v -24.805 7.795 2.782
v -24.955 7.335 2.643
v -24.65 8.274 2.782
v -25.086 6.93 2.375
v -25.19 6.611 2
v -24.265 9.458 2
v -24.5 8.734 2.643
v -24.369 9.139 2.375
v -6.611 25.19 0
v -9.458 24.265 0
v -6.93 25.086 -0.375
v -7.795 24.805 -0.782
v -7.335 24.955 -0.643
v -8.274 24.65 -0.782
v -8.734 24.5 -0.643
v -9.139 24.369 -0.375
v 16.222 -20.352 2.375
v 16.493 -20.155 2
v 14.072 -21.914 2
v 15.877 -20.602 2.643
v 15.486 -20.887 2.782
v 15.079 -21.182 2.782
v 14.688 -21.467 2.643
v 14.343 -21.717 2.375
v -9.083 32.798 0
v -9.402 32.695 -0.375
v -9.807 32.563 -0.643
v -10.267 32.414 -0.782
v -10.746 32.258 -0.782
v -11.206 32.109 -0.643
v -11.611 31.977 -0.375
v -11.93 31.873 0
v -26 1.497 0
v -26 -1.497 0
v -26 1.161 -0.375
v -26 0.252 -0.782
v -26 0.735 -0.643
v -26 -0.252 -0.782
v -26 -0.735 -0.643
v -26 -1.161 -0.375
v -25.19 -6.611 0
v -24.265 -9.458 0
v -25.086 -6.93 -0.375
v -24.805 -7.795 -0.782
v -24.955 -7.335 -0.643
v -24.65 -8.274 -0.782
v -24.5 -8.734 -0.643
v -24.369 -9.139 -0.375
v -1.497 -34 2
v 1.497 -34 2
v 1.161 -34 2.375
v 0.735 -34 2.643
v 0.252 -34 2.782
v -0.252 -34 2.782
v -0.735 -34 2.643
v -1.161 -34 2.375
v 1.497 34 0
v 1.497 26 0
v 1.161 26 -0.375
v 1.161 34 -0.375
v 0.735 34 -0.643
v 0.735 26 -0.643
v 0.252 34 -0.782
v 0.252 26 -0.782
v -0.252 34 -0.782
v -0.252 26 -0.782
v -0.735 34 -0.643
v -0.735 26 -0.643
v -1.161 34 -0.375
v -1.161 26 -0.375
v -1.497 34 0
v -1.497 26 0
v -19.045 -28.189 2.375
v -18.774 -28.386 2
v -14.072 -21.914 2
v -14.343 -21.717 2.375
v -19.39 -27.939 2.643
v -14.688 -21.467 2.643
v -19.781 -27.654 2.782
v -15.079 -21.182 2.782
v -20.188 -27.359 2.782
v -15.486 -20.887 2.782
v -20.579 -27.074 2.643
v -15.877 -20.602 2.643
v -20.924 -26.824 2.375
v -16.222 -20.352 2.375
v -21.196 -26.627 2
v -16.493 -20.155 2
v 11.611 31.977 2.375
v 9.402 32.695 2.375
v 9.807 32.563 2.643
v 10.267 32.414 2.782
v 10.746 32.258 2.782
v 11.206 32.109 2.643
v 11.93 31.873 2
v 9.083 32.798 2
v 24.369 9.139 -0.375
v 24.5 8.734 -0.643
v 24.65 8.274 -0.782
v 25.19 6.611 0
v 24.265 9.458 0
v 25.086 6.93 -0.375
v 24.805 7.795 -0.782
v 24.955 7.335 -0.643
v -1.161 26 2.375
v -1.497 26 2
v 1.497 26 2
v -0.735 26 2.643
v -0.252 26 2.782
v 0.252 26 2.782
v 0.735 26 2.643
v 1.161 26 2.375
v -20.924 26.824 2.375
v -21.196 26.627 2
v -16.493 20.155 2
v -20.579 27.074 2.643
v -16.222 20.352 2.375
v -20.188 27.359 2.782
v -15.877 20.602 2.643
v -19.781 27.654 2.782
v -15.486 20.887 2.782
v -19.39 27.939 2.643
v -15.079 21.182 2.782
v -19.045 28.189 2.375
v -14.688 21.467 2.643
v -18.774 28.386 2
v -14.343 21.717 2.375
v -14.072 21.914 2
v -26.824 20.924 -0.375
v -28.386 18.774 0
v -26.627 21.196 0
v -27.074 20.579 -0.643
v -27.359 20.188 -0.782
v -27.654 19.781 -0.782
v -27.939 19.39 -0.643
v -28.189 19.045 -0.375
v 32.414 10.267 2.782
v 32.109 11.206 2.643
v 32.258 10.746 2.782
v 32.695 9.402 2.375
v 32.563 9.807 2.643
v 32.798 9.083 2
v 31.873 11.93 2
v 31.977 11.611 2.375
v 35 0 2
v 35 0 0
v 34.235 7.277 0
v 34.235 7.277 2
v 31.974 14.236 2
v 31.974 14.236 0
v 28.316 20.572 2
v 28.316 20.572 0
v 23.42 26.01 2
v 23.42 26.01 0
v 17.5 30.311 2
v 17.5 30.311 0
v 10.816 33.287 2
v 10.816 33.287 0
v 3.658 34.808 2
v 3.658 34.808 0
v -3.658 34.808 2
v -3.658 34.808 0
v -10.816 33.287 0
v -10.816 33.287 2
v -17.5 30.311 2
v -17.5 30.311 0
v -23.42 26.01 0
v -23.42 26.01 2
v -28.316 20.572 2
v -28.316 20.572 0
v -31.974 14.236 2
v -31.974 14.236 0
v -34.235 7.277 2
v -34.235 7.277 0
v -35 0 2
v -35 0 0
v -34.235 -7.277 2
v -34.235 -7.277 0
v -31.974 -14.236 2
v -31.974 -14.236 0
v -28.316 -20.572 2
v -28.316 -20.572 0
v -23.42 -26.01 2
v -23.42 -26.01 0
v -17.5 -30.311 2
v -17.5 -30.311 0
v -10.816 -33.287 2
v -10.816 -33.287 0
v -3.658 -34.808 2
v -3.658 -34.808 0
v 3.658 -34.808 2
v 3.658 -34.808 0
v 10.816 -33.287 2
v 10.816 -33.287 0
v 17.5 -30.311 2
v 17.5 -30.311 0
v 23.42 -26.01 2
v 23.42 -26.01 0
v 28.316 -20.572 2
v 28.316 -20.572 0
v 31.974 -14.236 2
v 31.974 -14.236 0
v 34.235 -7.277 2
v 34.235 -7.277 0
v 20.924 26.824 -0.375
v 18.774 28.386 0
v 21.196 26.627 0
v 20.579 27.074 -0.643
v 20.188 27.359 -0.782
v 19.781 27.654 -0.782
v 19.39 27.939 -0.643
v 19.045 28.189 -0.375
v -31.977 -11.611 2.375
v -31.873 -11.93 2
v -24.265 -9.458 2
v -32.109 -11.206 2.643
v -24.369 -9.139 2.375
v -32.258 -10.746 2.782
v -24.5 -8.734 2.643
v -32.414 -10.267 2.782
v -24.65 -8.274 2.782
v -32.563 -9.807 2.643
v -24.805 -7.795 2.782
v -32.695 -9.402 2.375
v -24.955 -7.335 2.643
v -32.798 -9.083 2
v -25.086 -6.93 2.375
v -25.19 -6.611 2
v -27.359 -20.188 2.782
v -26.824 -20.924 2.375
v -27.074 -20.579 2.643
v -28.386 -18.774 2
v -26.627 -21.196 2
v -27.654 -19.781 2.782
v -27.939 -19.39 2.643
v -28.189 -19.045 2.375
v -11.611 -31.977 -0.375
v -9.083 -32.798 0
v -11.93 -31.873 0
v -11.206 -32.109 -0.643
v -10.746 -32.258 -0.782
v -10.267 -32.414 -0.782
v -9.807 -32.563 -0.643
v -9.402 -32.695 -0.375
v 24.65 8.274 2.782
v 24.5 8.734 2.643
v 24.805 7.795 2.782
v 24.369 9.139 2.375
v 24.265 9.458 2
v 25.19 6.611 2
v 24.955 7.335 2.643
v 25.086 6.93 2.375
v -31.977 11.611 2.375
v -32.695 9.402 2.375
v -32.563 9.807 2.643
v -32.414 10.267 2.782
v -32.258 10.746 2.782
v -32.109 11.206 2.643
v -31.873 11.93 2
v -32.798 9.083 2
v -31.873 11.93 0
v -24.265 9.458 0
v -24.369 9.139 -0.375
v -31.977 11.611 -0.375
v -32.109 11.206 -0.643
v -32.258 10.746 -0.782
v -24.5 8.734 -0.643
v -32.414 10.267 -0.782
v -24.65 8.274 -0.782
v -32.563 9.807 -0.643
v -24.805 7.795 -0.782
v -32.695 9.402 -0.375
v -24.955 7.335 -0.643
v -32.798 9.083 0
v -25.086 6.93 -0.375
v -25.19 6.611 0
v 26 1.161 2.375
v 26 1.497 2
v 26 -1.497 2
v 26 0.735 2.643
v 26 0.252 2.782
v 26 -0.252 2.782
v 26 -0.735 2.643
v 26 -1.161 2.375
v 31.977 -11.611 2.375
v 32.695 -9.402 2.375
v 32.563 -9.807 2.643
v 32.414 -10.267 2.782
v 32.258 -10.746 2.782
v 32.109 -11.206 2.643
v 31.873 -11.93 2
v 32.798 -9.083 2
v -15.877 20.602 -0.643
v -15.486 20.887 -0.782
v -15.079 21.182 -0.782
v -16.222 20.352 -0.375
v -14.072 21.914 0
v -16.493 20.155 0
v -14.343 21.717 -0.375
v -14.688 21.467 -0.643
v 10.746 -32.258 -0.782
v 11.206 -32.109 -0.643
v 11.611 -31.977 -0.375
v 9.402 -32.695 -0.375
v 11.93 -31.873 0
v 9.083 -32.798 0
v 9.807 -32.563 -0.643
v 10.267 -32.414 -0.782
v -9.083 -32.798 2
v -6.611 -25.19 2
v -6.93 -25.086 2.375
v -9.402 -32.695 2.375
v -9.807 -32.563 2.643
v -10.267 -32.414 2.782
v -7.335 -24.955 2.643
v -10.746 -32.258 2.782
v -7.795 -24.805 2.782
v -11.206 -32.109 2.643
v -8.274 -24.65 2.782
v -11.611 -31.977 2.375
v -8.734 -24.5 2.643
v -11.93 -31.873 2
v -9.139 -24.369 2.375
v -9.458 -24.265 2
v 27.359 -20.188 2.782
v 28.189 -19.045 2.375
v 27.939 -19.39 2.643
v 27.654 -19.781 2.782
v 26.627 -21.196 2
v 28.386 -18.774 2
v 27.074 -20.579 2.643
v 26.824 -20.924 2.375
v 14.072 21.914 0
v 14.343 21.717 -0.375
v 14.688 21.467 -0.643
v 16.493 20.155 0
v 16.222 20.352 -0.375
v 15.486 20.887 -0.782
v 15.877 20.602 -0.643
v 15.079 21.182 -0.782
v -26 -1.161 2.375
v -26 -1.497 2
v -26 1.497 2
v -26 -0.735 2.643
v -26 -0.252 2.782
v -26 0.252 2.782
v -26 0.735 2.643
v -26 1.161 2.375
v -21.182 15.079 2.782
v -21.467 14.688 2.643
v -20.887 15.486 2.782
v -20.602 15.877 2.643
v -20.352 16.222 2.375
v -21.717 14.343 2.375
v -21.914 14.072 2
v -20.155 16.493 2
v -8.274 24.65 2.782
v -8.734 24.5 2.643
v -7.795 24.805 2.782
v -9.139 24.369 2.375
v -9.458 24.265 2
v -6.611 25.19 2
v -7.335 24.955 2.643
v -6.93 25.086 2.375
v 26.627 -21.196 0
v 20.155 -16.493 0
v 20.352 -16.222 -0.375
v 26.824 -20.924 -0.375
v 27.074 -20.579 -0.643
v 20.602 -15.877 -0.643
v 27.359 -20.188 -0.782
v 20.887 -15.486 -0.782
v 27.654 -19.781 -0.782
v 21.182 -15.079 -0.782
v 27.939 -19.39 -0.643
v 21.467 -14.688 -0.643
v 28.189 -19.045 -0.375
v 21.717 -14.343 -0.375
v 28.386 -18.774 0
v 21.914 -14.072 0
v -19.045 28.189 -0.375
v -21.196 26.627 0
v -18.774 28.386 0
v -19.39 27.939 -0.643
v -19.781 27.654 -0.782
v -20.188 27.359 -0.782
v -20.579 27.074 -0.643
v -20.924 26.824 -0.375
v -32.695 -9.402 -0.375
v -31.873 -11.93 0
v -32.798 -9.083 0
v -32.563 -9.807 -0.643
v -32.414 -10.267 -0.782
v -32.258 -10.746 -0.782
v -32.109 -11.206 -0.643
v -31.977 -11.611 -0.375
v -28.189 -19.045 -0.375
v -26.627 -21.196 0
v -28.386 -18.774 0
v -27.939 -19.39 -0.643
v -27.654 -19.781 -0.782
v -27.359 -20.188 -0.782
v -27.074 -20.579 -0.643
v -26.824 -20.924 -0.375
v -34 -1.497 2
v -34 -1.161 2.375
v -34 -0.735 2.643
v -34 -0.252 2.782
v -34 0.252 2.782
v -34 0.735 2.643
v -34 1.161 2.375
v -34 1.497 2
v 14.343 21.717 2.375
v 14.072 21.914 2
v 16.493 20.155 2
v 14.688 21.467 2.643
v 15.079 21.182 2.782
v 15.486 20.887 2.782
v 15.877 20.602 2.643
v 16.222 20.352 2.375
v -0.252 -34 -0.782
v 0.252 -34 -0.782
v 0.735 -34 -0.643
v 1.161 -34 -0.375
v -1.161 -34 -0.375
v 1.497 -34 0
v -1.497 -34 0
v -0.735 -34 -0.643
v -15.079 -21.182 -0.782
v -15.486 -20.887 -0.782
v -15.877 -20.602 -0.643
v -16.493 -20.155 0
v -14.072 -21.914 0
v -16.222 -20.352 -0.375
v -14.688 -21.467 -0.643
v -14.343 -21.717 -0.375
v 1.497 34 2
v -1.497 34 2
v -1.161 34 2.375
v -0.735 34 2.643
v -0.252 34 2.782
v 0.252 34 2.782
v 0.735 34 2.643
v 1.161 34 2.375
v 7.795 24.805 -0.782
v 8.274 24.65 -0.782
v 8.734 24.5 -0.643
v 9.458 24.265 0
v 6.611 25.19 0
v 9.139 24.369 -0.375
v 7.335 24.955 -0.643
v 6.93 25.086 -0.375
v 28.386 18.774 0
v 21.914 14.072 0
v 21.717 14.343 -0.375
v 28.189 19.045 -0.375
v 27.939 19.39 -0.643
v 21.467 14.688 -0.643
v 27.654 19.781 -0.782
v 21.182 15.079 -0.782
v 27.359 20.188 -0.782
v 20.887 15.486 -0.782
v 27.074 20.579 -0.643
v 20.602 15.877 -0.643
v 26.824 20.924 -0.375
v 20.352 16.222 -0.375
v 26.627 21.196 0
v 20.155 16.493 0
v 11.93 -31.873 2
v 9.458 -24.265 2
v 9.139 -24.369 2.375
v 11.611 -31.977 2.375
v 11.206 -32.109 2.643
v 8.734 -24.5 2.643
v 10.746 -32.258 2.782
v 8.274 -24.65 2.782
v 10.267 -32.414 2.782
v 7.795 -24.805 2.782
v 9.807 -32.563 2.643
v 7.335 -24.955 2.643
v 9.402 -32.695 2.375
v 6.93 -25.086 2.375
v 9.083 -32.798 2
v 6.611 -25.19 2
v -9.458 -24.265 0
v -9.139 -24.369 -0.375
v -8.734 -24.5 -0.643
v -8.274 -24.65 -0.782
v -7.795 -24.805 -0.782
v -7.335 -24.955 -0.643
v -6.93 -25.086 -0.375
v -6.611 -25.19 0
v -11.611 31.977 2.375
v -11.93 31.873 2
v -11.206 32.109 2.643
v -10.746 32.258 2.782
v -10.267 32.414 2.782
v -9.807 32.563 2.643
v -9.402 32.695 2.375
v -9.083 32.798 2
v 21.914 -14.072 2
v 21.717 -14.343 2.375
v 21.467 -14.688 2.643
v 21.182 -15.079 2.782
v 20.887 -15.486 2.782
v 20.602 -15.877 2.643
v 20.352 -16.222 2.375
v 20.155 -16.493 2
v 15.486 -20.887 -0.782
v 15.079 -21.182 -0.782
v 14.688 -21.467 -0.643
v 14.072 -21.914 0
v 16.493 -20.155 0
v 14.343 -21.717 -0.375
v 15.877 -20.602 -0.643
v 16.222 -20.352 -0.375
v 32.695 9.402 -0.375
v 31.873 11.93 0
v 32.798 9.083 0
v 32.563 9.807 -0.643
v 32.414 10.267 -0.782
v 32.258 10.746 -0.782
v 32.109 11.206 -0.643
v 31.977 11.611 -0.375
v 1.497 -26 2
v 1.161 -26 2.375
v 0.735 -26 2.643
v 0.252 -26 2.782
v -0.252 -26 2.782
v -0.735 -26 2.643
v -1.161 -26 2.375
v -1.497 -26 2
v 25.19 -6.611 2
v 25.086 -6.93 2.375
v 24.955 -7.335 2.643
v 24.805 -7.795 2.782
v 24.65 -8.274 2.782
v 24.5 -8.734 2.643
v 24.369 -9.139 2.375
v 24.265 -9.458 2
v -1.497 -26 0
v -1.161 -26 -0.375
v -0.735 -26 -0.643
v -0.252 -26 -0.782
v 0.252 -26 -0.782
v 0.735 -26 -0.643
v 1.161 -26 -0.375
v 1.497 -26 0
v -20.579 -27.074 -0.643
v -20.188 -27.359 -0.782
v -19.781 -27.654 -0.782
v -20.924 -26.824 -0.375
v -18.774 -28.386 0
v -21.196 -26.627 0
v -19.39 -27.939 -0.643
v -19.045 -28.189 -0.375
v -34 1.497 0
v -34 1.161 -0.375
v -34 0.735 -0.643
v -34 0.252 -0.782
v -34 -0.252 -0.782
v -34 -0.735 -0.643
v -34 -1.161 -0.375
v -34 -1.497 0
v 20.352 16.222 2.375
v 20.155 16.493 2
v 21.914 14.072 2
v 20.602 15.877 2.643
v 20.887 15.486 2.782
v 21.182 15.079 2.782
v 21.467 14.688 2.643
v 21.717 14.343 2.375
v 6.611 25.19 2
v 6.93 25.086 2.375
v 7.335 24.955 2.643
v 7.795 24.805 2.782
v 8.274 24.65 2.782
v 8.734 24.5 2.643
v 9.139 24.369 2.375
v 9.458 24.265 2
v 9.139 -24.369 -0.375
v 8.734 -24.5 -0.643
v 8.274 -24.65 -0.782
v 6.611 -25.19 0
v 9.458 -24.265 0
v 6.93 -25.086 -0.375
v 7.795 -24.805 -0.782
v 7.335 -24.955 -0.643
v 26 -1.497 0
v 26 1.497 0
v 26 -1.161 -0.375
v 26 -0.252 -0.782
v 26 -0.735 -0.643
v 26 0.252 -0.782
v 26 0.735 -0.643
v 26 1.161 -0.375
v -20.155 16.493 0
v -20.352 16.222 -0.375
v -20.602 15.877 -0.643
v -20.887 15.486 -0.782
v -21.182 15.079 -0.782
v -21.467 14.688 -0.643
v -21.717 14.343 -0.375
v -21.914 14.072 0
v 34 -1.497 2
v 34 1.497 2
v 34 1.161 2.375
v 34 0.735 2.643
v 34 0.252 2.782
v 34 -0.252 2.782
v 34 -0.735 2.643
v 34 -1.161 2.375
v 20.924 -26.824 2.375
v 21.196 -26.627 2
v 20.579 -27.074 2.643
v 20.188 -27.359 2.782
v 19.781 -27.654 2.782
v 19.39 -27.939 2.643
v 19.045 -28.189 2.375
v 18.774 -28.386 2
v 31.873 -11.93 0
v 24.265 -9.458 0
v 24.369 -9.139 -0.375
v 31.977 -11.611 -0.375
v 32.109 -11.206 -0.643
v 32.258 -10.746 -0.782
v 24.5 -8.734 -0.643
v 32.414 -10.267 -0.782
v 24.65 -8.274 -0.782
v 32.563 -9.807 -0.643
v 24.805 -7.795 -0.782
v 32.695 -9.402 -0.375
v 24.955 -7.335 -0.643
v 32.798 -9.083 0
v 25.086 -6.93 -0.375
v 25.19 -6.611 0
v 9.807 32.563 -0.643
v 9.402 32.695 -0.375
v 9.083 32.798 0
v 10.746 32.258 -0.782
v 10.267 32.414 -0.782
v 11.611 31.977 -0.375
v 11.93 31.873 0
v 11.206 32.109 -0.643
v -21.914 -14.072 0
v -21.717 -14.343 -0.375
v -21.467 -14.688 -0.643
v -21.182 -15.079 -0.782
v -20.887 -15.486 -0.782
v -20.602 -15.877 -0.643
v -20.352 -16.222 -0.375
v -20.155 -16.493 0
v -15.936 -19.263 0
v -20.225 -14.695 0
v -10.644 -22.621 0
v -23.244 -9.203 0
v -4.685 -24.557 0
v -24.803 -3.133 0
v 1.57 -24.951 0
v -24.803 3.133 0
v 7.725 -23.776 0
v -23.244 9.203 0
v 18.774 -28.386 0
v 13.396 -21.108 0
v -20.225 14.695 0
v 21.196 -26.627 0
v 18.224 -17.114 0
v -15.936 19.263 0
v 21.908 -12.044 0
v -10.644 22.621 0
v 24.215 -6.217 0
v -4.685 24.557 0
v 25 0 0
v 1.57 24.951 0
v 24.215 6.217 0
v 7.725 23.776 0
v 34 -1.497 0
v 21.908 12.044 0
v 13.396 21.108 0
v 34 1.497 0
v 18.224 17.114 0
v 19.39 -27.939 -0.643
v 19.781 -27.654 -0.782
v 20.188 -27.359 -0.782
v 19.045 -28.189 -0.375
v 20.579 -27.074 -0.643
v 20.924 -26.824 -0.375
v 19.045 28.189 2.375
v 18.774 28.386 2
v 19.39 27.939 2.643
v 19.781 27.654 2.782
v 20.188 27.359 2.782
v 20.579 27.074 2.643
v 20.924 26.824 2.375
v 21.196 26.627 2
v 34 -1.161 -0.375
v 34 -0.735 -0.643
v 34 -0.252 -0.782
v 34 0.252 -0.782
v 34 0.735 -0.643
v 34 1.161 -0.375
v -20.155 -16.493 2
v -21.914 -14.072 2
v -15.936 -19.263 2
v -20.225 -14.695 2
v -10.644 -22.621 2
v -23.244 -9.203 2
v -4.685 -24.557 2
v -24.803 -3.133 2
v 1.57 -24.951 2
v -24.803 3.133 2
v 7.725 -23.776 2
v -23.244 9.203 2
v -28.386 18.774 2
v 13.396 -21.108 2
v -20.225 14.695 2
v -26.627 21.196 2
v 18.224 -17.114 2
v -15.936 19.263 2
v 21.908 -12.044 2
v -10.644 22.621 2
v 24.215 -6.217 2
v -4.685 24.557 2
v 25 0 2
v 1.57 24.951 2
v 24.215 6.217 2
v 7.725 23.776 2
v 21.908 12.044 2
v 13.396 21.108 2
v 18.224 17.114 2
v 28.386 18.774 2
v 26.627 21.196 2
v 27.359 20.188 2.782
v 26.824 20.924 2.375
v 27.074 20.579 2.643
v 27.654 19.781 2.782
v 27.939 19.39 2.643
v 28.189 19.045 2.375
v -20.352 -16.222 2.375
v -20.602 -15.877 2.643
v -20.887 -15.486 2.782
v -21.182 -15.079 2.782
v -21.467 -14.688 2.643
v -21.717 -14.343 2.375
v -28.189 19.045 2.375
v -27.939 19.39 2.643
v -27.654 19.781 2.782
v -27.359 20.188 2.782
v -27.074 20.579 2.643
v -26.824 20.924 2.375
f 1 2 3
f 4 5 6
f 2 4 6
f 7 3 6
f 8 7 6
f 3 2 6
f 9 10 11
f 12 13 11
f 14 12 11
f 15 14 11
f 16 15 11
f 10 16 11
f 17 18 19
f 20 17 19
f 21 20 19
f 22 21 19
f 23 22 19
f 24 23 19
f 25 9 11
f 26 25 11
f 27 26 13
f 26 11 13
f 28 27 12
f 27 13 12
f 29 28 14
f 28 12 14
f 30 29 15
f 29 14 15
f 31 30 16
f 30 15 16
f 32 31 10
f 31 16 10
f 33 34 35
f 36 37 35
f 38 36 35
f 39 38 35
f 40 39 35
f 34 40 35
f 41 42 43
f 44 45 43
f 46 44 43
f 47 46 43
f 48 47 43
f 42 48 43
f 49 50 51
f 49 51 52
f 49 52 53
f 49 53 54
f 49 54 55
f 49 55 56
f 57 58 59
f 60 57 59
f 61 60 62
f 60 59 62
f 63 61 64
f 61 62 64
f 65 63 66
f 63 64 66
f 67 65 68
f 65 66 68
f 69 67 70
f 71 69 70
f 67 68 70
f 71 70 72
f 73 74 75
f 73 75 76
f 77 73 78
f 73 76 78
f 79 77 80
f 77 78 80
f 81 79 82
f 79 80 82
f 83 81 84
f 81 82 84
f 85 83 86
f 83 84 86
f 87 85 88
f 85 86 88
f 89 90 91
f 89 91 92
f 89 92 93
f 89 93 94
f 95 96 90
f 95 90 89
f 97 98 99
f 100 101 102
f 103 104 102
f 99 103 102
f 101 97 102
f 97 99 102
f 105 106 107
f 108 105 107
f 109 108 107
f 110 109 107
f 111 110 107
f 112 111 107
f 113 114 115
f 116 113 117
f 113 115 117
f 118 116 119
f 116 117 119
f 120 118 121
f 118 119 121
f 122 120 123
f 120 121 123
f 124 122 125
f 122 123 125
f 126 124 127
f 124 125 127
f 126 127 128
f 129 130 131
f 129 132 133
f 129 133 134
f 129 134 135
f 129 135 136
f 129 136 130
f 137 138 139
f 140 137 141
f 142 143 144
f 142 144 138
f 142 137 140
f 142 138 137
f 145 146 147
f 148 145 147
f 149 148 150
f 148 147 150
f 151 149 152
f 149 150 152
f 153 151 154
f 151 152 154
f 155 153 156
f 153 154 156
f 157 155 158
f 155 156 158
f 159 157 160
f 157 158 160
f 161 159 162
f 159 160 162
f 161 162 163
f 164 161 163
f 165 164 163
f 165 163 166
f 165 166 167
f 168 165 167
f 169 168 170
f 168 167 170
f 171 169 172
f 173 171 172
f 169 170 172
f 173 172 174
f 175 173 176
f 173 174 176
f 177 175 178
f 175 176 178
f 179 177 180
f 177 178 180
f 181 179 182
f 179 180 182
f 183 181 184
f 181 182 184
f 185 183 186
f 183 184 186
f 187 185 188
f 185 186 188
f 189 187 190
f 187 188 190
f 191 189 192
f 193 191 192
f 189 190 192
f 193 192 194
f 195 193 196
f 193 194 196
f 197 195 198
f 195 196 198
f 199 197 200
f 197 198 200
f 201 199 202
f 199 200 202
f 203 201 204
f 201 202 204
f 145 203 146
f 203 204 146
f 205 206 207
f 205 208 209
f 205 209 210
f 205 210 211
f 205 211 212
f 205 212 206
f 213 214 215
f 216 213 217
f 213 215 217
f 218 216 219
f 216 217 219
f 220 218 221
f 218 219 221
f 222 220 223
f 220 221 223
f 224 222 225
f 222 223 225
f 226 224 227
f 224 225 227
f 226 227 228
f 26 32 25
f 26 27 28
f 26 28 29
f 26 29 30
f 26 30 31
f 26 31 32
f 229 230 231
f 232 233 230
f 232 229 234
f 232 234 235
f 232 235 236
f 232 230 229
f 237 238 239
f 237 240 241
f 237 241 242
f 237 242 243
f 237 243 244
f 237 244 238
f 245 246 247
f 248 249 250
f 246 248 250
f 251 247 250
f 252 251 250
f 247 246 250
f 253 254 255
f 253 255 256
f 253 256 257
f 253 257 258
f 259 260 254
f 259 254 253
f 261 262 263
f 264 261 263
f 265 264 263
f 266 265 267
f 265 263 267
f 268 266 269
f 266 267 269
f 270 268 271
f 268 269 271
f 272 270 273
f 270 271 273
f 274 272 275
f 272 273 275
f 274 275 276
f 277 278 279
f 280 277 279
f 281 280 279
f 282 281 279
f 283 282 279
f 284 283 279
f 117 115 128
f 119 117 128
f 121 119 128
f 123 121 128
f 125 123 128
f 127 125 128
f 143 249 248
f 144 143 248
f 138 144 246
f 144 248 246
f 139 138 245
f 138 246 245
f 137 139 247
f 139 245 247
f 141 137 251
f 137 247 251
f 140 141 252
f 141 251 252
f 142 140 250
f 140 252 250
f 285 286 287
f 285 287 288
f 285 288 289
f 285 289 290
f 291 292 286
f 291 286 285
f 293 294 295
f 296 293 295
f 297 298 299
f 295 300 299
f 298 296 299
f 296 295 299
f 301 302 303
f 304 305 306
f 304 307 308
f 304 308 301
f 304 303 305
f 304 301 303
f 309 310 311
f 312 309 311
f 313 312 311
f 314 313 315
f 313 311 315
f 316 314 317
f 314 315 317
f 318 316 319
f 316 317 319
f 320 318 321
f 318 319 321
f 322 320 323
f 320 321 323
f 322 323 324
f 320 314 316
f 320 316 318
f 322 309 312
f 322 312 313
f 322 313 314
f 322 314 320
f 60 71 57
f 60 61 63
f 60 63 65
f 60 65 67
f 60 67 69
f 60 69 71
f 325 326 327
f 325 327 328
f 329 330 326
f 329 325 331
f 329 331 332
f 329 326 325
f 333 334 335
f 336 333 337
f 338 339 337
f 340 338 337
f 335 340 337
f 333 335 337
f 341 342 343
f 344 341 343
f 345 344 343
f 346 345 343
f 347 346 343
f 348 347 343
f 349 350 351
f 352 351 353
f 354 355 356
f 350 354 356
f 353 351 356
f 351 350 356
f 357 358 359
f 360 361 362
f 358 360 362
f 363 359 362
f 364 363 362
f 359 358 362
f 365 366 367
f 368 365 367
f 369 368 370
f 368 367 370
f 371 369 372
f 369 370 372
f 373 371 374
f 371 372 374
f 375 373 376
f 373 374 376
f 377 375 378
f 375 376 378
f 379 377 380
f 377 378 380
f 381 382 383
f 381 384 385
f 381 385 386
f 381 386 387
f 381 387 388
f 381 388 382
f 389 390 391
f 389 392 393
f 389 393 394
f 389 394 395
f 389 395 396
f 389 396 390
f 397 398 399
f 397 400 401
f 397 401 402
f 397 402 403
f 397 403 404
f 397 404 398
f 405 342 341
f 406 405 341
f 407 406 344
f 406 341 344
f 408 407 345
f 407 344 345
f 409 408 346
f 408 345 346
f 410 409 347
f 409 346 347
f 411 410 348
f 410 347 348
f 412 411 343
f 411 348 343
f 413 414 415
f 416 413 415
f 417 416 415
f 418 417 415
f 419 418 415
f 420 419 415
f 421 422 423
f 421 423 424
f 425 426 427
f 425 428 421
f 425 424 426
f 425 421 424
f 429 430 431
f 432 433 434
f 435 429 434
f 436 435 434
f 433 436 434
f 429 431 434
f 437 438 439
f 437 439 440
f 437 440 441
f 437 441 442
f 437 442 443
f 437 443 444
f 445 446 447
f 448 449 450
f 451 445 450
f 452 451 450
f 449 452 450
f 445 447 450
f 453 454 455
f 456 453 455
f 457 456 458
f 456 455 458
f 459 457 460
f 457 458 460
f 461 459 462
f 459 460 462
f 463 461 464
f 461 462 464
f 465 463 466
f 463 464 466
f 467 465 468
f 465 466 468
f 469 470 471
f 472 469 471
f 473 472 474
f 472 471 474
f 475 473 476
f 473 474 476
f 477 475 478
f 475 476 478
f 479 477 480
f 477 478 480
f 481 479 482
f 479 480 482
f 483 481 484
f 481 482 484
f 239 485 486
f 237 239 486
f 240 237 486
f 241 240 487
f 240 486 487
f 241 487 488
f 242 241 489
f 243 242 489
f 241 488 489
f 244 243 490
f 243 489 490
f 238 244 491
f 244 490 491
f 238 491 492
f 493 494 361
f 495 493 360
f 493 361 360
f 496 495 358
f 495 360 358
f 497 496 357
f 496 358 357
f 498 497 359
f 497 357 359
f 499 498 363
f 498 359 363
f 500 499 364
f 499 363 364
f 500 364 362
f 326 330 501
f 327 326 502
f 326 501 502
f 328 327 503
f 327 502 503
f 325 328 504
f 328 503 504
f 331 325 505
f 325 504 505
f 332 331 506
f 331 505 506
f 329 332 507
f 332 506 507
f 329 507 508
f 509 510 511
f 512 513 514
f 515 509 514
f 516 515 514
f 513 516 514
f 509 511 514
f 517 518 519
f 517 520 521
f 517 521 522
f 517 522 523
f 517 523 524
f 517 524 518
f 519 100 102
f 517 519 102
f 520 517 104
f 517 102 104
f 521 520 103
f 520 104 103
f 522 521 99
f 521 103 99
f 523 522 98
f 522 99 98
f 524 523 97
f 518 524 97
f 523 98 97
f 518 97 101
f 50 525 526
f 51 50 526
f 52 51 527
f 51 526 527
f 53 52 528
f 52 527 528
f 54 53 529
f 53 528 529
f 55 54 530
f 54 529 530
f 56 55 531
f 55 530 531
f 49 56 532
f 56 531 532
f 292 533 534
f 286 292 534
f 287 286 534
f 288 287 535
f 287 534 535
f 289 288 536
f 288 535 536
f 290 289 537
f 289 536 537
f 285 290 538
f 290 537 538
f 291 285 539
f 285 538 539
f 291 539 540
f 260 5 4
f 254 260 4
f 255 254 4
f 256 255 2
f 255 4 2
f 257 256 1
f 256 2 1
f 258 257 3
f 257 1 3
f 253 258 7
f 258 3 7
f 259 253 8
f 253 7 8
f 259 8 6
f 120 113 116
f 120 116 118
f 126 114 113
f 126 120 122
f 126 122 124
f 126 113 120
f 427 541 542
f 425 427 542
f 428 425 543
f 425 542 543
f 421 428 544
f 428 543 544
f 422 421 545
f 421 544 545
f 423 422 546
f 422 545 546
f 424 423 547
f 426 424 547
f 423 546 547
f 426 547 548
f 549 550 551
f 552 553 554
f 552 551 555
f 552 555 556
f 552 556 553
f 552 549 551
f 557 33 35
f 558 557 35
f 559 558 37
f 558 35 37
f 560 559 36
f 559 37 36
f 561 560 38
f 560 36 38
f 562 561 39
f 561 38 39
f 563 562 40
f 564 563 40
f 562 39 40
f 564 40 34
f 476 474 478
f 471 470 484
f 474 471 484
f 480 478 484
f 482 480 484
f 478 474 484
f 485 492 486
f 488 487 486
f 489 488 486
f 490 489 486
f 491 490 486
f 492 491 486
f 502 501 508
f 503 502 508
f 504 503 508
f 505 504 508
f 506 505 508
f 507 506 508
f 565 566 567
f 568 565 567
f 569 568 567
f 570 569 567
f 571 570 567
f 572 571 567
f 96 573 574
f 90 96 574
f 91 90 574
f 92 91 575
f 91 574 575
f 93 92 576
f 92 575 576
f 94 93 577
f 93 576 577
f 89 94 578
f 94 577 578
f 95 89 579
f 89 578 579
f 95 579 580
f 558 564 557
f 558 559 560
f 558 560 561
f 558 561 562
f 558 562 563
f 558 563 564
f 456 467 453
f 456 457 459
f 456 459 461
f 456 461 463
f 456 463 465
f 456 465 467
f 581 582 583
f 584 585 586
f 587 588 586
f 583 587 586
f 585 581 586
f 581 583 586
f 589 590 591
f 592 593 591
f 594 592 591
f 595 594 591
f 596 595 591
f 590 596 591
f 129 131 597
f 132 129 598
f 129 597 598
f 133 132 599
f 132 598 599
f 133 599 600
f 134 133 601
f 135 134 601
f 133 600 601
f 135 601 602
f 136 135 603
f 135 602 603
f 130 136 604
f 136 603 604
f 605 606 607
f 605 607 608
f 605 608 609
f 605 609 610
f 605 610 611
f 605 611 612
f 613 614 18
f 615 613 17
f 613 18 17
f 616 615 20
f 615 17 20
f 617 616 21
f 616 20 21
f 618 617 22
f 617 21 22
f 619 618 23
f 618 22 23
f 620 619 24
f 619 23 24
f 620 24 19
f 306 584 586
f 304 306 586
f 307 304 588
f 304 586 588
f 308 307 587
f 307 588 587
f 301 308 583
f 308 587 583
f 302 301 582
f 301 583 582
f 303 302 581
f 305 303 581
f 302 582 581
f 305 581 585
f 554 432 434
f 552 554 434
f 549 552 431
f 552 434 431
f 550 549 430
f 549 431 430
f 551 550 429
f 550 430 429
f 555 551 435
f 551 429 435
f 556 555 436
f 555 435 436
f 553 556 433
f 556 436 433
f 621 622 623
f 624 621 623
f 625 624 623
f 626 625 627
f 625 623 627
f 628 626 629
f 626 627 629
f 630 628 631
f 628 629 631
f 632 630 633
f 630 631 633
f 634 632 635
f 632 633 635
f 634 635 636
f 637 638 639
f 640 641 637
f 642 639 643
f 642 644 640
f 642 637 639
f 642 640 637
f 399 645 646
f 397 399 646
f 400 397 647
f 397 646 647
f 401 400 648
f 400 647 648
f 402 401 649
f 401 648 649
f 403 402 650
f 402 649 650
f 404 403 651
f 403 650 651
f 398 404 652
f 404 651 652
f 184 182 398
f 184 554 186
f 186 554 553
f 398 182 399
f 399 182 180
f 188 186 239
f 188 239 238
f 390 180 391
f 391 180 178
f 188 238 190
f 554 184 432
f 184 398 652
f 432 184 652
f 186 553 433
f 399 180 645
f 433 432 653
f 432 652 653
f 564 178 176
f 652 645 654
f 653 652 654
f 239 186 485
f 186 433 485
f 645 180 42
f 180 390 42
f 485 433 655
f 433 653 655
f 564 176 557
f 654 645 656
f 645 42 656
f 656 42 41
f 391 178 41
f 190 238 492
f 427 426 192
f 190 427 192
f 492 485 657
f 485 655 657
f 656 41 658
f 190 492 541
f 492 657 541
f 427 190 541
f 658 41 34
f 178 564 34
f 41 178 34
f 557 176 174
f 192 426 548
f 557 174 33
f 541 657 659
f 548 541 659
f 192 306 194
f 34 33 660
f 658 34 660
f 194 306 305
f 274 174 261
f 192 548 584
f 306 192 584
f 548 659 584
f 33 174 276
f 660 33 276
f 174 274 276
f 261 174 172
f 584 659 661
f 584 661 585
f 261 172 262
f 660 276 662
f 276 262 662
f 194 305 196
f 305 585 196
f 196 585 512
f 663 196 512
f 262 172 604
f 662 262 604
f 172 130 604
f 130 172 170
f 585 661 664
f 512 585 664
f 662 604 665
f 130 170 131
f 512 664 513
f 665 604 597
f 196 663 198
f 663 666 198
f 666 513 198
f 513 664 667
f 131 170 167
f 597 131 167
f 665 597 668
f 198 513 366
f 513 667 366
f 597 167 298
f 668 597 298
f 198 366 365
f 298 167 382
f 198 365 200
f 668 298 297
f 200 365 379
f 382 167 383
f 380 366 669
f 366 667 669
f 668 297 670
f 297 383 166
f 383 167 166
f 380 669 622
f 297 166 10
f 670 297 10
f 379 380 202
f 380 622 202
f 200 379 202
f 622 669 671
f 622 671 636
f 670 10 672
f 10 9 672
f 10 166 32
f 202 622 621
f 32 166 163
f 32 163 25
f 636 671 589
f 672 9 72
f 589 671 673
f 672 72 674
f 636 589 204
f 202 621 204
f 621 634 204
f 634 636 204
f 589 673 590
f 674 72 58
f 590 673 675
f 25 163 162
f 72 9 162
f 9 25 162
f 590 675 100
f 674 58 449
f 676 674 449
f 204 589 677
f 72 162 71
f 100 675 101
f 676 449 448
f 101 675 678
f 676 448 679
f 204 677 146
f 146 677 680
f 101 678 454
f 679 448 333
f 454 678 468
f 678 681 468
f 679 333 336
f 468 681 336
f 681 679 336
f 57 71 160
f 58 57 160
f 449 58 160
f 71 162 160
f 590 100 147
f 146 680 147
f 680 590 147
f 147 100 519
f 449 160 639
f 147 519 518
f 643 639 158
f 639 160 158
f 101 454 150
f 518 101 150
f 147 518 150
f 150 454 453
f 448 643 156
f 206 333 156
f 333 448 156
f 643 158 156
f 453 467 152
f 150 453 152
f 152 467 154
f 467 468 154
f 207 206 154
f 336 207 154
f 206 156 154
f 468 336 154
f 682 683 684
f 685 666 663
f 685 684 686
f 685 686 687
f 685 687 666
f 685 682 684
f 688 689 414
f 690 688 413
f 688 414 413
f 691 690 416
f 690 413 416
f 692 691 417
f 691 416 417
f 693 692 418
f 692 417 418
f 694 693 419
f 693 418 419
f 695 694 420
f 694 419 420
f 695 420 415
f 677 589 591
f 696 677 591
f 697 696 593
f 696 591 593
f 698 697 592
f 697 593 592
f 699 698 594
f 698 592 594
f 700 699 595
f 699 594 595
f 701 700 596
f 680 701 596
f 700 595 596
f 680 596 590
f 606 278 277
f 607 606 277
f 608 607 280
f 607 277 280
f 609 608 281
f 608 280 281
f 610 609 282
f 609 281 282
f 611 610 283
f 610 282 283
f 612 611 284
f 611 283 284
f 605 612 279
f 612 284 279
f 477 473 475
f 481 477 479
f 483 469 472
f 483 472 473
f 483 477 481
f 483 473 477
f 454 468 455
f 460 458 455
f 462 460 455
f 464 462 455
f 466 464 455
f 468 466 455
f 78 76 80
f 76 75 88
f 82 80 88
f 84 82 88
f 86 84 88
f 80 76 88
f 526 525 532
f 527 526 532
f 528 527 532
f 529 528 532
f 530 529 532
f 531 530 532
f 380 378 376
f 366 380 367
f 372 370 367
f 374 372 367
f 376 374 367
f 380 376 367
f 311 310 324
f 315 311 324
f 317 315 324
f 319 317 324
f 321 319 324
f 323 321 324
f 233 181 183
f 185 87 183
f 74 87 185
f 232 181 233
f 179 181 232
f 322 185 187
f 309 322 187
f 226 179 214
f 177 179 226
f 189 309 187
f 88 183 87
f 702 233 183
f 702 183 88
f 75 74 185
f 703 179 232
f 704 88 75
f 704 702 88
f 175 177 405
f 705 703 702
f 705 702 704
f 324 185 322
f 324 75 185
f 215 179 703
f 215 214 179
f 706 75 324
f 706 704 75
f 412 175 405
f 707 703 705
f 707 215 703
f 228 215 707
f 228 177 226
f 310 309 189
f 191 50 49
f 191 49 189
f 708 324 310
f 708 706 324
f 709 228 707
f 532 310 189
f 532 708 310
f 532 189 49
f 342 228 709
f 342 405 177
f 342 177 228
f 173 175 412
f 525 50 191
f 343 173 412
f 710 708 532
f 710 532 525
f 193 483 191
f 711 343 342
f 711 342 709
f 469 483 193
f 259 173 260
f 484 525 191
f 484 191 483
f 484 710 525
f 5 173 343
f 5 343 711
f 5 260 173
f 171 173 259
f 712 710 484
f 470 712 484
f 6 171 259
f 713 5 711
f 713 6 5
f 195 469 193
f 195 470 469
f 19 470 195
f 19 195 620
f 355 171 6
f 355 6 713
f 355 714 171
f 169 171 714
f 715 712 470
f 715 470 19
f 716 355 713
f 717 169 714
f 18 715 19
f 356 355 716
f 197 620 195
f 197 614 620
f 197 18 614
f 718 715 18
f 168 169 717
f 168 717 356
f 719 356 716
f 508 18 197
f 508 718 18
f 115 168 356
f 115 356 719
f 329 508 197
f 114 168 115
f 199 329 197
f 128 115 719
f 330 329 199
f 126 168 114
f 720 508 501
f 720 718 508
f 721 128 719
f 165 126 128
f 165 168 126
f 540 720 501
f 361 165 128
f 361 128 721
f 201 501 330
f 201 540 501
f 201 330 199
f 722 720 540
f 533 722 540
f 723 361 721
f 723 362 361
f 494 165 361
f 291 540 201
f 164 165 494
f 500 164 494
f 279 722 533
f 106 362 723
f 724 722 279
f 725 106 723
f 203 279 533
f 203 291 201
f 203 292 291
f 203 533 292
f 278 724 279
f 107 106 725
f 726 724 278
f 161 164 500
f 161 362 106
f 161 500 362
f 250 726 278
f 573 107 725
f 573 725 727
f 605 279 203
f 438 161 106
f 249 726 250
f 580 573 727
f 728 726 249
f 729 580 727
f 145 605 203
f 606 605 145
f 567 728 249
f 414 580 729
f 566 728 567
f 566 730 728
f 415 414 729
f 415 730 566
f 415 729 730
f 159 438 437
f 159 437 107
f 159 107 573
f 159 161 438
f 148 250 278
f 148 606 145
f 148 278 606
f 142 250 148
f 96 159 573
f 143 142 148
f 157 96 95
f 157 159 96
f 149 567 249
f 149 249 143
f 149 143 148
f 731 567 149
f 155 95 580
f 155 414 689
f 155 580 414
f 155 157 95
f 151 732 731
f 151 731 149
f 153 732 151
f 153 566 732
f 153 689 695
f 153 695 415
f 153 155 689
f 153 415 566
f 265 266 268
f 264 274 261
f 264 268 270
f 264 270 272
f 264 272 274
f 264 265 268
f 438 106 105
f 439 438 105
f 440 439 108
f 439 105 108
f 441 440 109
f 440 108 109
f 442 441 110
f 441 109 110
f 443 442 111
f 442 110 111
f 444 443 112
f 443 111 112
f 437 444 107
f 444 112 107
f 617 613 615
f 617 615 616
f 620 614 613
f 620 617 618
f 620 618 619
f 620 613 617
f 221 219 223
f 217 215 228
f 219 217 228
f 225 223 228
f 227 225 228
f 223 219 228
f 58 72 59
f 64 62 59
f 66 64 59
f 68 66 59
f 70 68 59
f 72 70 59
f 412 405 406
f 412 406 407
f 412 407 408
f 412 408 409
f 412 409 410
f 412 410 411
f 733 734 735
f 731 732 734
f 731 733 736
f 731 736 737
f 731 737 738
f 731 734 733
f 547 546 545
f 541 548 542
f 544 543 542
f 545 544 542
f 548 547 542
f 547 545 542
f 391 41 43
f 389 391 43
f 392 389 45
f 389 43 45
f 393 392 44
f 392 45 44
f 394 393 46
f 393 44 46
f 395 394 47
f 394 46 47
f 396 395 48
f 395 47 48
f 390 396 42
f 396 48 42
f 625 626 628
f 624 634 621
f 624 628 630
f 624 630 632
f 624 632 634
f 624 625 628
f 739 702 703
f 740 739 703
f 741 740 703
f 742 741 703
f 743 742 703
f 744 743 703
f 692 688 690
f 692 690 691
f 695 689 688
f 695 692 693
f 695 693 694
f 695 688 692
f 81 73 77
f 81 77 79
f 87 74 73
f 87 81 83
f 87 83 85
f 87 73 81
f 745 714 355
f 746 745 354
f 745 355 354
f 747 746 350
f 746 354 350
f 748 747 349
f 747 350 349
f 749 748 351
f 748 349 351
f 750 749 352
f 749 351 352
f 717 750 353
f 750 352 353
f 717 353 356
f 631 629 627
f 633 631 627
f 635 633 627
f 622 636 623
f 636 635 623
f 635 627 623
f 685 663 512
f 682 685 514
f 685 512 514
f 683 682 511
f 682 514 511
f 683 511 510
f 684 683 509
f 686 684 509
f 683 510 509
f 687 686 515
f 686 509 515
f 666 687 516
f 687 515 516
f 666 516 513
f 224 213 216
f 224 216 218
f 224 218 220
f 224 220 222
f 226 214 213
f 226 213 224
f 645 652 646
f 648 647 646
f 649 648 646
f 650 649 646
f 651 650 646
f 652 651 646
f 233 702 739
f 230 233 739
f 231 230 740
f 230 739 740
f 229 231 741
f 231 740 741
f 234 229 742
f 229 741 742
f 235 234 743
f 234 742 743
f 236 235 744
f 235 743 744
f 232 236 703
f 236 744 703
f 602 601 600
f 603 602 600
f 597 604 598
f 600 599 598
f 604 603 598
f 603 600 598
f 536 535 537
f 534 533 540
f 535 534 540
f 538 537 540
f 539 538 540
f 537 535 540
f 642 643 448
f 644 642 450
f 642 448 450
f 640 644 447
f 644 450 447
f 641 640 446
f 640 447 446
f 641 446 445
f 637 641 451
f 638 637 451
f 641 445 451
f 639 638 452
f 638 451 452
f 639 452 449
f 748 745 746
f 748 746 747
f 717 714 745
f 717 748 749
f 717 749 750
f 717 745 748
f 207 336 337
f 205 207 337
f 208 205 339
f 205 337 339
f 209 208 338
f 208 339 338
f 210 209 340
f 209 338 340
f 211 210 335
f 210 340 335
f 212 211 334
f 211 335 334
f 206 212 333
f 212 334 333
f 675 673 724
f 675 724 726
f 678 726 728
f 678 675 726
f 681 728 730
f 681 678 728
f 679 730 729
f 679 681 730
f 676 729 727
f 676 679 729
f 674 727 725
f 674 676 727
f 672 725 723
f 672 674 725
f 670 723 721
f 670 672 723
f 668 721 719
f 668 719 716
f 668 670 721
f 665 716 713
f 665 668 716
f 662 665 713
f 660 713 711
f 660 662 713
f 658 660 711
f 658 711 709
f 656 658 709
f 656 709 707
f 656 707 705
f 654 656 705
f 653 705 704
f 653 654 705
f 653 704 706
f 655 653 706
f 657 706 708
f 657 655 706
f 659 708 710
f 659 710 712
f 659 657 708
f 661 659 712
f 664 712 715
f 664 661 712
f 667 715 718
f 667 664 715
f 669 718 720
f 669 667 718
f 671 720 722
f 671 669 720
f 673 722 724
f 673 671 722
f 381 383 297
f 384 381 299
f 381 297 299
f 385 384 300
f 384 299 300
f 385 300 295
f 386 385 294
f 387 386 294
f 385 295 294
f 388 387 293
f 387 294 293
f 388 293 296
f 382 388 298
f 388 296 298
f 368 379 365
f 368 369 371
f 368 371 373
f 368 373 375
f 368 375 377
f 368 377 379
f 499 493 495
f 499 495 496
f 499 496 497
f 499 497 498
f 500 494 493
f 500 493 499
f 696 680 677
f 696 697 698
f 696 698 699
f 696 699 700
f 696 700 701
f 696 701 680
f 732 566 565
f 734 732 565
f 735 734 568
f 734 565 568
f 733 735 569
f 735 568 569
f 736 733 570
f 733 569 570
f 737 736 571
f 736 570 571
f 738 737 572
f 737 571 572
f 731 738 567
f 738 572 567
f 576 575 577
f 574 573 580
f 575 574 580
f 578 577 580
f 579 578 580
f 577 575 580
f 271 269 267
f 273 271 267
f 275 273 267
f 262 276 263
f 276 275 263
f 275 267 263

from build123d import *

# Parameters (mm, degrees)
ESQUISSE1_R                  = 35
ESQUISSE1_R_2                = 25
BOSS_EXTRU_1_DEPTH           = 2
BOSS_EXTRU_2_START           = 26
ESQUISSE2_R                  = 1.8
BOSS_EXTRU_2_DEPTH           = 8
R_P_TITION_CIRCULAIRE1_COUNT = 20


with BuildPart() as part:
    # Esquisse1 → Boss.-Extru.1 (new body)
    with BuildSketch(Plane.XY):
        Circle(ESQUISSE1_R)
        Circle(ESQUISSE1_R_2, mode=Mode.SUBTRACT)
    extrude(amount=BOSS_EXTRU_1_DEPTH)

    # Esquisse2 → Boss.-Extru.2 (add)
    with BuildSketch(Plane(origin=(0, 0, 0), x_dir=(1, 0, 0), z_dir=(0, 1, 0)).offset(BOSS_EXTRU_2_START)):
        with Locations((0, -1)):
            Circle(ESQUISSE2_R)
    boss_extru_2 = extrude(amount=BOSS_EXTRU_2_DEPTH)

    # Répétition circulaire1: Boss.-Extru.2 ×20 about axis
    r_p_tition_circulaire1_axis = Axis((0, 0, 0), (0, 0, 1))
    for i in range(1, R_P_TITION_CIRCULAIRE1_COUNT):
        add(boss_extru_2.rotate(r_p_tition_circulaire1_axis, i * 360 / R_P_TITION_CIRCULAIRE1_COUNT))


solid = part.part
